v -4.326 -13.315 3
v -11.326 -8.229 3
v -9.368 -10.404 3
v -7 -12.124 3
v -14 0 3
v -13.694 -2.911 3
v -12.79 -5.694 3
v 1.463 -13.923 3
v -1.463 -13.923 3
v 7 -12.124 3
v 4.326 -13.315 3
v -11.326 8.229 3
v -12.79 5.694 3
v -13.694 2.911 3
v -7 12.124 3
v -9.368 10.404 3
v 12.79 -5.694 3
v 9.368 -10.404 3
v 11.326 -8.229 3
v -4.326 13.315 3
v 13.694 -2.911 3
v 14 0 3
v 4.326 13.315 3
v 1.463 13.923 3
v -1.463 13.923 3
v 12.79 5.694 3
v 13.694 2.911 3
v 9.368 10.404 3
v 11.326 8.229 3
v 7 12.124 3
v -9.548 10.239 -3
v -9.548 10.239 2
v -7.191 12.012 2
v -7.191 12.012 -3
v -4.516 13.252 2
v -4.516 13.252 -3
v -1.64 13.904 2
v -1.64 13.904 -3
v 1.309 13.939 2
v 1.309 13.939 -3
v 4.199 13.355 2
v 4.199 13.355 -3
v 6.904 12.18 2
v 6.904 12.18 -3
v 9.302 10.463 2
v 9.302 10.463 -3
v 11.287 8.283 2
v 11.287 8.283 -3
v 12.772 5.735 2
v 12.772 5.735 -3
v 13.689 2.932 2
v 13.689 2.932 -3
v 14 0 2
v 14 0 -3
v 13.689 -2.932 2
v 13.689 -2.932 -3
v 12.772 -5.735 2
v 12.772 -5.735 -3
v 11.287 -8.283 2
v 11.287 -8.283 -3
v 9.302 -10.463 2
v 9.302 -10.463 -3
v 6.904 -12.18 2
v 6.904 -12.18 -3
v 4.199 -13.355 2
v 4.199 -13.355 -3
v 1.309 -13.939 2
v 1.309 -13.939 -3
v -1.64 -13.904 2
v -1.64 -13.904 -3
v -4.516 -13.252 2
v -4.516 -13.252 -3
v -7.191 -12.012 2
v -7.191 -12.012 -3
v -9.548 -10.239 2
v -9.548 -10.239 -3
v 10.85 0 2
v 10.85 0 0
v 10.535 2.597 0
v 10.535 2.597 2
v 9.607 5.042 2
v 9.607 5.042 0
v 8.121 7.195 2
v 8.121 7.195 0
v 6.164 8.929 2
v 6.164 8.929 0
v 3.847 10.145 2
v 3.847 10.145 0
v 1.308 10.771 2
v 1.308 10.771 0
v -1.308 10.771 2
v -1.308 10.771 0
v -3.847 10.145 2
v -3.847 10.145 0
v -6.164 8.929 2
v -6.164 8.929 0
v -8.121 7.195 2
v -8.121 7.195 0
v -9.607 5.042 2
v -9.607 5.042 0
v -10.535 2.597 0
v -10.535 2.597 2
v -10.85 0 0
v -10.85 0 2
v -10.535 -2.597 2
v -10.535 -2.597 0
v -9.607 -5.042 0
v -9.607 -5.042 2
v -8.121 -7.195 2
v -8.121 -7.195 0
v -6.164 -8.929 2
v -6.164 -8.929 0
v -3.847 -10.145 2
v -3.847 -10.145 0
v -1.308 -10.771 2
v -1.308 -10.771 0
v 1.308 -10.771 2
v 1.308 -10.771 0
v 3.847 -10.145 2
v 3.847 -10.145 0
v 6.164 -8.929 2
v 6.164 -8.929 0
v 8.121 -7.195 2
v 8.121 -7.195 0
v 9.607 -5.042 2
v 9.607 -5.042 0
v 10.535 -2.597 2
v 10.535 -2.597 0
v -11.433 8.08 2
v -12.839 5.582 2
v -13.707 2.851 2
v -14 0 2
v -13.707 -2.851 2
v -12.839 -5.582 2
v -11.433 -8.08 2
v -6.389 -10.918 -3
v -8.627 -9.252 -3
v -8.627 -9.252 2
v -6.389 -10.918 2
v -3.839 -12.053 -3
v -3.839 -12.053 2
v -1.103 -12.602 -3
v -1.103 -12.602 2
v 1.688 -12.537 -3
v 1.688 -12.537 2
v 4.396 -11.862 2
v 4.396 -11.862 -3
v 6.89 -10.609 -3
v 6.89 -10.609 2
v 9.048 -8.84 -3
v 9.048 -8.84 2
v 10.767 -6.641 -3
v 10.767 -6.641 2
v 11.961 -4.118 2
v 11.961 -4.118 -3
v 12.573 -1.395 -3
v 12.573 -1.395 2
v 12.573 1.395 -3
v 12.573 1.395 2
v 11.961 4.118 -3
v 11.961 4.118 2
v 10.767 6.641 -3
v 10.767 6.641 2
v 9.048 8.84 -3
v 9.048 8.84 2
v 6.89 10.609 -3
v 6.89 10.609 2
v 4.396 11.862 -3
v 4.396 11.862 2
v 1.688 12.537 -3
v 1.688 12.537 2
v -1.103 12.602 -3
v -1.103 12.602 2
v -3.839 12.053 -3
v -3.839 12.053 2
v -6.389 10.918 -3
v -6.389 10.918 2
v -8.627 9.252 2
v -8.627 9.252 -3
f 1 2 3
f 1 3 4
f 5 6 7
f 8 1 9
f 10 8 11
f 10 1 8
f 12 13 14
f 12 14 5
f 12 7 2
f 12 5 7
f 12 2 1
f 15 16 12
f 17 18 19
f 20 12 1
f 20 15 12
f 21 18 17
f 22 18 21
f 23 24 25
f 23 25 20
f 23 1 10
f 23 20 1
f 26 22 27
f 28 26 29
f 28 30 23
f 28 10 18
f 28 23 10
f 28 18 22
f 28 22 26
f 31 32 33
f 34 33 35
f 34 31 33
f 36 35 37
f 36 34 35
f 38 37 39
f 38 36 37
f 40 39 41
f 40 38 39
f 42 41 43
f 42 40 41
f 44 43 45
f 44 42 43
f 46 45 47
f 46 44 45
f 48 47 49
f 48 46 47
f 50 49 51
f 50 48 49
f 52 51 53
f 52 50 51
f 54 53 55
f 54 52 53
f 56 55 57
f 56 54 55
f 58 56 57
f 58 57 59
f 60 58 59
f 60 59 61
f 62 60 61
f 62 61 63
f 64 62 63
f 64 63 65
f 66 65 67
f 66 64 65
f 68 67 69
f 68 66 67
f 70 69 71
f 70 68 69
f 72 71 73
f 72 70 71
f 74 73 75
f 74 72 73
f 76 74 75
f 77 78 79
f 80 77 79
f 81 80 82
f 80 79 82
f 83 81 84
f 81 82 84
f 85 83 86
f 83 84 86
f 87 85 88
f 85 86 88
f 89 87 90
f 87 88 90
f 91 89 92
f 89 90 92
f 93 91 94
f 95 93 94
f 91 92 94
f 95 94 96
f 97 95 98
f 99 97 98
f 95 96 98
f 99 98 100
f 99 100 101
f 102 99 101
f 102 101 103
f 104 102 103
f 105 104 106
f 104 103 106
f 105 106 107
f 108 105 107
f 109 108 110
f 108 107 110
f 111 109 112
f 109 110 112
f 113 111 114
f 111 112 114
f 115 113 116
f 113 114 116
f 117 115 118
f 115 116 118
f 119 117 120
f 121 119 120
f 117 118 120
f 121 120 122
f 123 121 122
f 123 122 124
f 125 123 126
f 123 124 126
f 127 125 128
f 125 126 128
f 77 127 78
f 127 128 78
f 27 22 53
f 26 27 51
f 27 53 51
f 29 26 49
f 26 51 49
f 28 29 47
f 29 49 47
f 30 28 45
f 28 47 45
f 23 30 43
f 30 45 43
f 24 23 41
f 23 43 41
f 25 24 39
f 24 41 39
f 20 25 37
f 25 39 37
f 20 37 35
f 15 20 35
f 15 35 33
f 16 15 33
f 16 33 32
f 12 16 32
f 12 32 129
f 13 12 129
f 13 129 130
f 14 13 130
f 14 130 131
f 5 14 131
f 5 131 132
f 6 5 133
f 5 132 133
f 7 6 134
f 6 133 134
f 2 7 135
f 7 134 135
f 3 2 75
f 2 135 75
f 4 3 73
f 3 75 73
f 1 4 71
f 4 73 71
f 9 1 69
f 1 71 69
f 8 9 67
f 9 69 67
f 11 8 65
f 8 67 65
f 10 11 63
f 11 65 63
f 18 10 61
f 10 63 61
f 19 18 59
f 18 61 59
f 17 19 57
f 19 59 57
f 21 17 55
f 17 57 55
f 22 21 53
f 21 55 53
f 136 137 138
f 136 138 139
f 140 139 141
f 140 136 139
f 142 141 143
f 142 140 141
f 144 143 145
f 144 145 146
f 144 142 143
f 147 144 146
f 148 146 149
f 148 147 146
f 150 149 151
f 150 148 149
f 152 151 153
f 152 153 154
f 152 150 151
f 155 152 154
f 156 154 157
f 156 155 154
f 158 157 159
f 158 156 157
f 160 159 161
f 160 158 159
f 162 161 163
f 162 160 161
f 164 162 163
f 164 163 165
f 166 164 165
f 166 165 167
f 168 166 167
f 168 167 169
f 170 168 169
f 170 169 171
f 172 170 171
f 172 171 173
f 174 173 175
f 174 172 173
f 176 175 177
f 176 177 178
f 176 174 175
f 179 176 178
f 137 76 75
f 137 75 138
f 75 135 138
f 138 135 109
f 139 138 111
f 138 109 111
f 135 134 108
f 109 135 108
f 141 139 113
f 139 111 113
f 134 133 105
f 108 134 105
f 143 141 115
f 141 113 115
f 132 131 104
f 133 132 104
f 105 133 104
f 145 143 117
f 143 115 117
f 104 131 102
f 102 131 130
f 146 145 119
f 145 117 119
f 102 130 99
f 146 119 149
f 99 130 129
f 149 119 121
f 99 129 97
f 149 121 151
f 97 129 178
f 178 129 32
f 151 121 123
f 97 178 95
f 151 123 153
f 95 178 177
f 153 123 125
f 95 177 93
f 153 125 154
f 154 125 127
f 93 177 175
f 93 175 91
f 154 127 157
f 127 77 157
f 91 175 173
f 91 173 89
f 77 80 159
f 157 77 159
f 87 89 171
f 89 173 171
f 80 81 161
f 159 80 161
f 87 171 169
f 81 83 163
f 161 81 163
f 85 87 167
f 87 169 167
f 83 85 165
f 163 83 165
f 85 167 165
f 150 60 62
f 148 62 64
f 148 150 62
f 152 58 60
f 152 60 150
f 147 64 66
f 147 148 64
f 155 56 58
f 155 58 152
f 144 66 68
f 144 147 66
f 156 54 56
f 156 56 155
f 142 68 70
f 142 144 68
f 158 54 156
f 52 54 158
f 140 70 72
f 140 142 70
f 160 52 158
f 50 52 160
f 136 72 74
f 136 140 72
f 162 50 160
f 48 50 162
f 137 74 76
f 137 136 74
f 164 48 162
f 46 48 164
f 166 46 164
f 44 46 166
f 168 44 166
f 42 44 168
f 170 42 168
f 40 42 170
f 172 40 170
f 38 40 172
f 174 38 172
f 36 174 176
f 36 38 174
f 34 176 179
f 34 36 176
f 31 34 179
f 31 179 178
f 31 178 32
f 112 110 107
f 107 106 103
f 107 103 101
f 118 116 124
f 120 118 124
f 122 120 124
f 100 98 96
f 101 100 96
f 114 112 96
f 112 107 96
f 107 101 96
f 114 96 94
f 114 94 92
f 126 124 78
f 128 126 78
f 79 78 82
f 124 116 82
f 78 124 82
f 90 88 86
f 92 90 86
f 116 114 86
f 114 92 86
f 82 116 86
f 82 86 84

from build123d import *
from build123d.topology import SkipClean

# Parameters (mm, degrees)
SKETCH1_R           = 10.85
BOSS_EXTRUDE1_DEPTH = 2
SKETCH2_R           = 14
BOSS_EXTRUDE2_DEPTH = 1
BOSS_EXTRUDE3_START = 5
BOSS_EXTRUDE3_DEPTH = 5


with BuildPart() as part:
    # Sketch1 → Boss-Extrude1 (new body)
    with BuildSketch(Plane.XY):
        Circle(SKETCH1_R)
    extrude(amount=BOSS_EXTRUDE1_DEPTH)

    # Sketch2 → Boss-Extrude2 (add)
    with BuildSketch(Plane.XY.offset(2)):
        Circle(SKETCH2_R)
    extrude(amount=BOSS_EXTRUDE2_DEPTH)

    # Sketch3 → Boss-Extrude3 (add)
    with SkipClean():  # the faces are left unmerged after this step: merging them gives an invalid solid
        with BuildSketch(Plane(origin=(0, 0, 2), x_dir=(-1, 0, 0), z_dir=(0, 0, -1)).offset(BOSS_EXTRUDE3_START)):
            with BuildLine():
                ThreePointArc((8.627279255, -9.251624325), (-12.65, 0), (8.627279255, 9.251624325))
                Line((8.627279255, 9.251624325), (9.547977041, 10.238951823))
                ThreePointArc((9.547977041, 10.238951823), (-14, 0), (9.547977041, -10.238951823))
                Line((9.547977041, -10.238951823), (8.627279255, -9.251624325))
            make_face()
        extrude(amount=-BOSS_EXTRUDE3_DEPTH)


solid = part.part
